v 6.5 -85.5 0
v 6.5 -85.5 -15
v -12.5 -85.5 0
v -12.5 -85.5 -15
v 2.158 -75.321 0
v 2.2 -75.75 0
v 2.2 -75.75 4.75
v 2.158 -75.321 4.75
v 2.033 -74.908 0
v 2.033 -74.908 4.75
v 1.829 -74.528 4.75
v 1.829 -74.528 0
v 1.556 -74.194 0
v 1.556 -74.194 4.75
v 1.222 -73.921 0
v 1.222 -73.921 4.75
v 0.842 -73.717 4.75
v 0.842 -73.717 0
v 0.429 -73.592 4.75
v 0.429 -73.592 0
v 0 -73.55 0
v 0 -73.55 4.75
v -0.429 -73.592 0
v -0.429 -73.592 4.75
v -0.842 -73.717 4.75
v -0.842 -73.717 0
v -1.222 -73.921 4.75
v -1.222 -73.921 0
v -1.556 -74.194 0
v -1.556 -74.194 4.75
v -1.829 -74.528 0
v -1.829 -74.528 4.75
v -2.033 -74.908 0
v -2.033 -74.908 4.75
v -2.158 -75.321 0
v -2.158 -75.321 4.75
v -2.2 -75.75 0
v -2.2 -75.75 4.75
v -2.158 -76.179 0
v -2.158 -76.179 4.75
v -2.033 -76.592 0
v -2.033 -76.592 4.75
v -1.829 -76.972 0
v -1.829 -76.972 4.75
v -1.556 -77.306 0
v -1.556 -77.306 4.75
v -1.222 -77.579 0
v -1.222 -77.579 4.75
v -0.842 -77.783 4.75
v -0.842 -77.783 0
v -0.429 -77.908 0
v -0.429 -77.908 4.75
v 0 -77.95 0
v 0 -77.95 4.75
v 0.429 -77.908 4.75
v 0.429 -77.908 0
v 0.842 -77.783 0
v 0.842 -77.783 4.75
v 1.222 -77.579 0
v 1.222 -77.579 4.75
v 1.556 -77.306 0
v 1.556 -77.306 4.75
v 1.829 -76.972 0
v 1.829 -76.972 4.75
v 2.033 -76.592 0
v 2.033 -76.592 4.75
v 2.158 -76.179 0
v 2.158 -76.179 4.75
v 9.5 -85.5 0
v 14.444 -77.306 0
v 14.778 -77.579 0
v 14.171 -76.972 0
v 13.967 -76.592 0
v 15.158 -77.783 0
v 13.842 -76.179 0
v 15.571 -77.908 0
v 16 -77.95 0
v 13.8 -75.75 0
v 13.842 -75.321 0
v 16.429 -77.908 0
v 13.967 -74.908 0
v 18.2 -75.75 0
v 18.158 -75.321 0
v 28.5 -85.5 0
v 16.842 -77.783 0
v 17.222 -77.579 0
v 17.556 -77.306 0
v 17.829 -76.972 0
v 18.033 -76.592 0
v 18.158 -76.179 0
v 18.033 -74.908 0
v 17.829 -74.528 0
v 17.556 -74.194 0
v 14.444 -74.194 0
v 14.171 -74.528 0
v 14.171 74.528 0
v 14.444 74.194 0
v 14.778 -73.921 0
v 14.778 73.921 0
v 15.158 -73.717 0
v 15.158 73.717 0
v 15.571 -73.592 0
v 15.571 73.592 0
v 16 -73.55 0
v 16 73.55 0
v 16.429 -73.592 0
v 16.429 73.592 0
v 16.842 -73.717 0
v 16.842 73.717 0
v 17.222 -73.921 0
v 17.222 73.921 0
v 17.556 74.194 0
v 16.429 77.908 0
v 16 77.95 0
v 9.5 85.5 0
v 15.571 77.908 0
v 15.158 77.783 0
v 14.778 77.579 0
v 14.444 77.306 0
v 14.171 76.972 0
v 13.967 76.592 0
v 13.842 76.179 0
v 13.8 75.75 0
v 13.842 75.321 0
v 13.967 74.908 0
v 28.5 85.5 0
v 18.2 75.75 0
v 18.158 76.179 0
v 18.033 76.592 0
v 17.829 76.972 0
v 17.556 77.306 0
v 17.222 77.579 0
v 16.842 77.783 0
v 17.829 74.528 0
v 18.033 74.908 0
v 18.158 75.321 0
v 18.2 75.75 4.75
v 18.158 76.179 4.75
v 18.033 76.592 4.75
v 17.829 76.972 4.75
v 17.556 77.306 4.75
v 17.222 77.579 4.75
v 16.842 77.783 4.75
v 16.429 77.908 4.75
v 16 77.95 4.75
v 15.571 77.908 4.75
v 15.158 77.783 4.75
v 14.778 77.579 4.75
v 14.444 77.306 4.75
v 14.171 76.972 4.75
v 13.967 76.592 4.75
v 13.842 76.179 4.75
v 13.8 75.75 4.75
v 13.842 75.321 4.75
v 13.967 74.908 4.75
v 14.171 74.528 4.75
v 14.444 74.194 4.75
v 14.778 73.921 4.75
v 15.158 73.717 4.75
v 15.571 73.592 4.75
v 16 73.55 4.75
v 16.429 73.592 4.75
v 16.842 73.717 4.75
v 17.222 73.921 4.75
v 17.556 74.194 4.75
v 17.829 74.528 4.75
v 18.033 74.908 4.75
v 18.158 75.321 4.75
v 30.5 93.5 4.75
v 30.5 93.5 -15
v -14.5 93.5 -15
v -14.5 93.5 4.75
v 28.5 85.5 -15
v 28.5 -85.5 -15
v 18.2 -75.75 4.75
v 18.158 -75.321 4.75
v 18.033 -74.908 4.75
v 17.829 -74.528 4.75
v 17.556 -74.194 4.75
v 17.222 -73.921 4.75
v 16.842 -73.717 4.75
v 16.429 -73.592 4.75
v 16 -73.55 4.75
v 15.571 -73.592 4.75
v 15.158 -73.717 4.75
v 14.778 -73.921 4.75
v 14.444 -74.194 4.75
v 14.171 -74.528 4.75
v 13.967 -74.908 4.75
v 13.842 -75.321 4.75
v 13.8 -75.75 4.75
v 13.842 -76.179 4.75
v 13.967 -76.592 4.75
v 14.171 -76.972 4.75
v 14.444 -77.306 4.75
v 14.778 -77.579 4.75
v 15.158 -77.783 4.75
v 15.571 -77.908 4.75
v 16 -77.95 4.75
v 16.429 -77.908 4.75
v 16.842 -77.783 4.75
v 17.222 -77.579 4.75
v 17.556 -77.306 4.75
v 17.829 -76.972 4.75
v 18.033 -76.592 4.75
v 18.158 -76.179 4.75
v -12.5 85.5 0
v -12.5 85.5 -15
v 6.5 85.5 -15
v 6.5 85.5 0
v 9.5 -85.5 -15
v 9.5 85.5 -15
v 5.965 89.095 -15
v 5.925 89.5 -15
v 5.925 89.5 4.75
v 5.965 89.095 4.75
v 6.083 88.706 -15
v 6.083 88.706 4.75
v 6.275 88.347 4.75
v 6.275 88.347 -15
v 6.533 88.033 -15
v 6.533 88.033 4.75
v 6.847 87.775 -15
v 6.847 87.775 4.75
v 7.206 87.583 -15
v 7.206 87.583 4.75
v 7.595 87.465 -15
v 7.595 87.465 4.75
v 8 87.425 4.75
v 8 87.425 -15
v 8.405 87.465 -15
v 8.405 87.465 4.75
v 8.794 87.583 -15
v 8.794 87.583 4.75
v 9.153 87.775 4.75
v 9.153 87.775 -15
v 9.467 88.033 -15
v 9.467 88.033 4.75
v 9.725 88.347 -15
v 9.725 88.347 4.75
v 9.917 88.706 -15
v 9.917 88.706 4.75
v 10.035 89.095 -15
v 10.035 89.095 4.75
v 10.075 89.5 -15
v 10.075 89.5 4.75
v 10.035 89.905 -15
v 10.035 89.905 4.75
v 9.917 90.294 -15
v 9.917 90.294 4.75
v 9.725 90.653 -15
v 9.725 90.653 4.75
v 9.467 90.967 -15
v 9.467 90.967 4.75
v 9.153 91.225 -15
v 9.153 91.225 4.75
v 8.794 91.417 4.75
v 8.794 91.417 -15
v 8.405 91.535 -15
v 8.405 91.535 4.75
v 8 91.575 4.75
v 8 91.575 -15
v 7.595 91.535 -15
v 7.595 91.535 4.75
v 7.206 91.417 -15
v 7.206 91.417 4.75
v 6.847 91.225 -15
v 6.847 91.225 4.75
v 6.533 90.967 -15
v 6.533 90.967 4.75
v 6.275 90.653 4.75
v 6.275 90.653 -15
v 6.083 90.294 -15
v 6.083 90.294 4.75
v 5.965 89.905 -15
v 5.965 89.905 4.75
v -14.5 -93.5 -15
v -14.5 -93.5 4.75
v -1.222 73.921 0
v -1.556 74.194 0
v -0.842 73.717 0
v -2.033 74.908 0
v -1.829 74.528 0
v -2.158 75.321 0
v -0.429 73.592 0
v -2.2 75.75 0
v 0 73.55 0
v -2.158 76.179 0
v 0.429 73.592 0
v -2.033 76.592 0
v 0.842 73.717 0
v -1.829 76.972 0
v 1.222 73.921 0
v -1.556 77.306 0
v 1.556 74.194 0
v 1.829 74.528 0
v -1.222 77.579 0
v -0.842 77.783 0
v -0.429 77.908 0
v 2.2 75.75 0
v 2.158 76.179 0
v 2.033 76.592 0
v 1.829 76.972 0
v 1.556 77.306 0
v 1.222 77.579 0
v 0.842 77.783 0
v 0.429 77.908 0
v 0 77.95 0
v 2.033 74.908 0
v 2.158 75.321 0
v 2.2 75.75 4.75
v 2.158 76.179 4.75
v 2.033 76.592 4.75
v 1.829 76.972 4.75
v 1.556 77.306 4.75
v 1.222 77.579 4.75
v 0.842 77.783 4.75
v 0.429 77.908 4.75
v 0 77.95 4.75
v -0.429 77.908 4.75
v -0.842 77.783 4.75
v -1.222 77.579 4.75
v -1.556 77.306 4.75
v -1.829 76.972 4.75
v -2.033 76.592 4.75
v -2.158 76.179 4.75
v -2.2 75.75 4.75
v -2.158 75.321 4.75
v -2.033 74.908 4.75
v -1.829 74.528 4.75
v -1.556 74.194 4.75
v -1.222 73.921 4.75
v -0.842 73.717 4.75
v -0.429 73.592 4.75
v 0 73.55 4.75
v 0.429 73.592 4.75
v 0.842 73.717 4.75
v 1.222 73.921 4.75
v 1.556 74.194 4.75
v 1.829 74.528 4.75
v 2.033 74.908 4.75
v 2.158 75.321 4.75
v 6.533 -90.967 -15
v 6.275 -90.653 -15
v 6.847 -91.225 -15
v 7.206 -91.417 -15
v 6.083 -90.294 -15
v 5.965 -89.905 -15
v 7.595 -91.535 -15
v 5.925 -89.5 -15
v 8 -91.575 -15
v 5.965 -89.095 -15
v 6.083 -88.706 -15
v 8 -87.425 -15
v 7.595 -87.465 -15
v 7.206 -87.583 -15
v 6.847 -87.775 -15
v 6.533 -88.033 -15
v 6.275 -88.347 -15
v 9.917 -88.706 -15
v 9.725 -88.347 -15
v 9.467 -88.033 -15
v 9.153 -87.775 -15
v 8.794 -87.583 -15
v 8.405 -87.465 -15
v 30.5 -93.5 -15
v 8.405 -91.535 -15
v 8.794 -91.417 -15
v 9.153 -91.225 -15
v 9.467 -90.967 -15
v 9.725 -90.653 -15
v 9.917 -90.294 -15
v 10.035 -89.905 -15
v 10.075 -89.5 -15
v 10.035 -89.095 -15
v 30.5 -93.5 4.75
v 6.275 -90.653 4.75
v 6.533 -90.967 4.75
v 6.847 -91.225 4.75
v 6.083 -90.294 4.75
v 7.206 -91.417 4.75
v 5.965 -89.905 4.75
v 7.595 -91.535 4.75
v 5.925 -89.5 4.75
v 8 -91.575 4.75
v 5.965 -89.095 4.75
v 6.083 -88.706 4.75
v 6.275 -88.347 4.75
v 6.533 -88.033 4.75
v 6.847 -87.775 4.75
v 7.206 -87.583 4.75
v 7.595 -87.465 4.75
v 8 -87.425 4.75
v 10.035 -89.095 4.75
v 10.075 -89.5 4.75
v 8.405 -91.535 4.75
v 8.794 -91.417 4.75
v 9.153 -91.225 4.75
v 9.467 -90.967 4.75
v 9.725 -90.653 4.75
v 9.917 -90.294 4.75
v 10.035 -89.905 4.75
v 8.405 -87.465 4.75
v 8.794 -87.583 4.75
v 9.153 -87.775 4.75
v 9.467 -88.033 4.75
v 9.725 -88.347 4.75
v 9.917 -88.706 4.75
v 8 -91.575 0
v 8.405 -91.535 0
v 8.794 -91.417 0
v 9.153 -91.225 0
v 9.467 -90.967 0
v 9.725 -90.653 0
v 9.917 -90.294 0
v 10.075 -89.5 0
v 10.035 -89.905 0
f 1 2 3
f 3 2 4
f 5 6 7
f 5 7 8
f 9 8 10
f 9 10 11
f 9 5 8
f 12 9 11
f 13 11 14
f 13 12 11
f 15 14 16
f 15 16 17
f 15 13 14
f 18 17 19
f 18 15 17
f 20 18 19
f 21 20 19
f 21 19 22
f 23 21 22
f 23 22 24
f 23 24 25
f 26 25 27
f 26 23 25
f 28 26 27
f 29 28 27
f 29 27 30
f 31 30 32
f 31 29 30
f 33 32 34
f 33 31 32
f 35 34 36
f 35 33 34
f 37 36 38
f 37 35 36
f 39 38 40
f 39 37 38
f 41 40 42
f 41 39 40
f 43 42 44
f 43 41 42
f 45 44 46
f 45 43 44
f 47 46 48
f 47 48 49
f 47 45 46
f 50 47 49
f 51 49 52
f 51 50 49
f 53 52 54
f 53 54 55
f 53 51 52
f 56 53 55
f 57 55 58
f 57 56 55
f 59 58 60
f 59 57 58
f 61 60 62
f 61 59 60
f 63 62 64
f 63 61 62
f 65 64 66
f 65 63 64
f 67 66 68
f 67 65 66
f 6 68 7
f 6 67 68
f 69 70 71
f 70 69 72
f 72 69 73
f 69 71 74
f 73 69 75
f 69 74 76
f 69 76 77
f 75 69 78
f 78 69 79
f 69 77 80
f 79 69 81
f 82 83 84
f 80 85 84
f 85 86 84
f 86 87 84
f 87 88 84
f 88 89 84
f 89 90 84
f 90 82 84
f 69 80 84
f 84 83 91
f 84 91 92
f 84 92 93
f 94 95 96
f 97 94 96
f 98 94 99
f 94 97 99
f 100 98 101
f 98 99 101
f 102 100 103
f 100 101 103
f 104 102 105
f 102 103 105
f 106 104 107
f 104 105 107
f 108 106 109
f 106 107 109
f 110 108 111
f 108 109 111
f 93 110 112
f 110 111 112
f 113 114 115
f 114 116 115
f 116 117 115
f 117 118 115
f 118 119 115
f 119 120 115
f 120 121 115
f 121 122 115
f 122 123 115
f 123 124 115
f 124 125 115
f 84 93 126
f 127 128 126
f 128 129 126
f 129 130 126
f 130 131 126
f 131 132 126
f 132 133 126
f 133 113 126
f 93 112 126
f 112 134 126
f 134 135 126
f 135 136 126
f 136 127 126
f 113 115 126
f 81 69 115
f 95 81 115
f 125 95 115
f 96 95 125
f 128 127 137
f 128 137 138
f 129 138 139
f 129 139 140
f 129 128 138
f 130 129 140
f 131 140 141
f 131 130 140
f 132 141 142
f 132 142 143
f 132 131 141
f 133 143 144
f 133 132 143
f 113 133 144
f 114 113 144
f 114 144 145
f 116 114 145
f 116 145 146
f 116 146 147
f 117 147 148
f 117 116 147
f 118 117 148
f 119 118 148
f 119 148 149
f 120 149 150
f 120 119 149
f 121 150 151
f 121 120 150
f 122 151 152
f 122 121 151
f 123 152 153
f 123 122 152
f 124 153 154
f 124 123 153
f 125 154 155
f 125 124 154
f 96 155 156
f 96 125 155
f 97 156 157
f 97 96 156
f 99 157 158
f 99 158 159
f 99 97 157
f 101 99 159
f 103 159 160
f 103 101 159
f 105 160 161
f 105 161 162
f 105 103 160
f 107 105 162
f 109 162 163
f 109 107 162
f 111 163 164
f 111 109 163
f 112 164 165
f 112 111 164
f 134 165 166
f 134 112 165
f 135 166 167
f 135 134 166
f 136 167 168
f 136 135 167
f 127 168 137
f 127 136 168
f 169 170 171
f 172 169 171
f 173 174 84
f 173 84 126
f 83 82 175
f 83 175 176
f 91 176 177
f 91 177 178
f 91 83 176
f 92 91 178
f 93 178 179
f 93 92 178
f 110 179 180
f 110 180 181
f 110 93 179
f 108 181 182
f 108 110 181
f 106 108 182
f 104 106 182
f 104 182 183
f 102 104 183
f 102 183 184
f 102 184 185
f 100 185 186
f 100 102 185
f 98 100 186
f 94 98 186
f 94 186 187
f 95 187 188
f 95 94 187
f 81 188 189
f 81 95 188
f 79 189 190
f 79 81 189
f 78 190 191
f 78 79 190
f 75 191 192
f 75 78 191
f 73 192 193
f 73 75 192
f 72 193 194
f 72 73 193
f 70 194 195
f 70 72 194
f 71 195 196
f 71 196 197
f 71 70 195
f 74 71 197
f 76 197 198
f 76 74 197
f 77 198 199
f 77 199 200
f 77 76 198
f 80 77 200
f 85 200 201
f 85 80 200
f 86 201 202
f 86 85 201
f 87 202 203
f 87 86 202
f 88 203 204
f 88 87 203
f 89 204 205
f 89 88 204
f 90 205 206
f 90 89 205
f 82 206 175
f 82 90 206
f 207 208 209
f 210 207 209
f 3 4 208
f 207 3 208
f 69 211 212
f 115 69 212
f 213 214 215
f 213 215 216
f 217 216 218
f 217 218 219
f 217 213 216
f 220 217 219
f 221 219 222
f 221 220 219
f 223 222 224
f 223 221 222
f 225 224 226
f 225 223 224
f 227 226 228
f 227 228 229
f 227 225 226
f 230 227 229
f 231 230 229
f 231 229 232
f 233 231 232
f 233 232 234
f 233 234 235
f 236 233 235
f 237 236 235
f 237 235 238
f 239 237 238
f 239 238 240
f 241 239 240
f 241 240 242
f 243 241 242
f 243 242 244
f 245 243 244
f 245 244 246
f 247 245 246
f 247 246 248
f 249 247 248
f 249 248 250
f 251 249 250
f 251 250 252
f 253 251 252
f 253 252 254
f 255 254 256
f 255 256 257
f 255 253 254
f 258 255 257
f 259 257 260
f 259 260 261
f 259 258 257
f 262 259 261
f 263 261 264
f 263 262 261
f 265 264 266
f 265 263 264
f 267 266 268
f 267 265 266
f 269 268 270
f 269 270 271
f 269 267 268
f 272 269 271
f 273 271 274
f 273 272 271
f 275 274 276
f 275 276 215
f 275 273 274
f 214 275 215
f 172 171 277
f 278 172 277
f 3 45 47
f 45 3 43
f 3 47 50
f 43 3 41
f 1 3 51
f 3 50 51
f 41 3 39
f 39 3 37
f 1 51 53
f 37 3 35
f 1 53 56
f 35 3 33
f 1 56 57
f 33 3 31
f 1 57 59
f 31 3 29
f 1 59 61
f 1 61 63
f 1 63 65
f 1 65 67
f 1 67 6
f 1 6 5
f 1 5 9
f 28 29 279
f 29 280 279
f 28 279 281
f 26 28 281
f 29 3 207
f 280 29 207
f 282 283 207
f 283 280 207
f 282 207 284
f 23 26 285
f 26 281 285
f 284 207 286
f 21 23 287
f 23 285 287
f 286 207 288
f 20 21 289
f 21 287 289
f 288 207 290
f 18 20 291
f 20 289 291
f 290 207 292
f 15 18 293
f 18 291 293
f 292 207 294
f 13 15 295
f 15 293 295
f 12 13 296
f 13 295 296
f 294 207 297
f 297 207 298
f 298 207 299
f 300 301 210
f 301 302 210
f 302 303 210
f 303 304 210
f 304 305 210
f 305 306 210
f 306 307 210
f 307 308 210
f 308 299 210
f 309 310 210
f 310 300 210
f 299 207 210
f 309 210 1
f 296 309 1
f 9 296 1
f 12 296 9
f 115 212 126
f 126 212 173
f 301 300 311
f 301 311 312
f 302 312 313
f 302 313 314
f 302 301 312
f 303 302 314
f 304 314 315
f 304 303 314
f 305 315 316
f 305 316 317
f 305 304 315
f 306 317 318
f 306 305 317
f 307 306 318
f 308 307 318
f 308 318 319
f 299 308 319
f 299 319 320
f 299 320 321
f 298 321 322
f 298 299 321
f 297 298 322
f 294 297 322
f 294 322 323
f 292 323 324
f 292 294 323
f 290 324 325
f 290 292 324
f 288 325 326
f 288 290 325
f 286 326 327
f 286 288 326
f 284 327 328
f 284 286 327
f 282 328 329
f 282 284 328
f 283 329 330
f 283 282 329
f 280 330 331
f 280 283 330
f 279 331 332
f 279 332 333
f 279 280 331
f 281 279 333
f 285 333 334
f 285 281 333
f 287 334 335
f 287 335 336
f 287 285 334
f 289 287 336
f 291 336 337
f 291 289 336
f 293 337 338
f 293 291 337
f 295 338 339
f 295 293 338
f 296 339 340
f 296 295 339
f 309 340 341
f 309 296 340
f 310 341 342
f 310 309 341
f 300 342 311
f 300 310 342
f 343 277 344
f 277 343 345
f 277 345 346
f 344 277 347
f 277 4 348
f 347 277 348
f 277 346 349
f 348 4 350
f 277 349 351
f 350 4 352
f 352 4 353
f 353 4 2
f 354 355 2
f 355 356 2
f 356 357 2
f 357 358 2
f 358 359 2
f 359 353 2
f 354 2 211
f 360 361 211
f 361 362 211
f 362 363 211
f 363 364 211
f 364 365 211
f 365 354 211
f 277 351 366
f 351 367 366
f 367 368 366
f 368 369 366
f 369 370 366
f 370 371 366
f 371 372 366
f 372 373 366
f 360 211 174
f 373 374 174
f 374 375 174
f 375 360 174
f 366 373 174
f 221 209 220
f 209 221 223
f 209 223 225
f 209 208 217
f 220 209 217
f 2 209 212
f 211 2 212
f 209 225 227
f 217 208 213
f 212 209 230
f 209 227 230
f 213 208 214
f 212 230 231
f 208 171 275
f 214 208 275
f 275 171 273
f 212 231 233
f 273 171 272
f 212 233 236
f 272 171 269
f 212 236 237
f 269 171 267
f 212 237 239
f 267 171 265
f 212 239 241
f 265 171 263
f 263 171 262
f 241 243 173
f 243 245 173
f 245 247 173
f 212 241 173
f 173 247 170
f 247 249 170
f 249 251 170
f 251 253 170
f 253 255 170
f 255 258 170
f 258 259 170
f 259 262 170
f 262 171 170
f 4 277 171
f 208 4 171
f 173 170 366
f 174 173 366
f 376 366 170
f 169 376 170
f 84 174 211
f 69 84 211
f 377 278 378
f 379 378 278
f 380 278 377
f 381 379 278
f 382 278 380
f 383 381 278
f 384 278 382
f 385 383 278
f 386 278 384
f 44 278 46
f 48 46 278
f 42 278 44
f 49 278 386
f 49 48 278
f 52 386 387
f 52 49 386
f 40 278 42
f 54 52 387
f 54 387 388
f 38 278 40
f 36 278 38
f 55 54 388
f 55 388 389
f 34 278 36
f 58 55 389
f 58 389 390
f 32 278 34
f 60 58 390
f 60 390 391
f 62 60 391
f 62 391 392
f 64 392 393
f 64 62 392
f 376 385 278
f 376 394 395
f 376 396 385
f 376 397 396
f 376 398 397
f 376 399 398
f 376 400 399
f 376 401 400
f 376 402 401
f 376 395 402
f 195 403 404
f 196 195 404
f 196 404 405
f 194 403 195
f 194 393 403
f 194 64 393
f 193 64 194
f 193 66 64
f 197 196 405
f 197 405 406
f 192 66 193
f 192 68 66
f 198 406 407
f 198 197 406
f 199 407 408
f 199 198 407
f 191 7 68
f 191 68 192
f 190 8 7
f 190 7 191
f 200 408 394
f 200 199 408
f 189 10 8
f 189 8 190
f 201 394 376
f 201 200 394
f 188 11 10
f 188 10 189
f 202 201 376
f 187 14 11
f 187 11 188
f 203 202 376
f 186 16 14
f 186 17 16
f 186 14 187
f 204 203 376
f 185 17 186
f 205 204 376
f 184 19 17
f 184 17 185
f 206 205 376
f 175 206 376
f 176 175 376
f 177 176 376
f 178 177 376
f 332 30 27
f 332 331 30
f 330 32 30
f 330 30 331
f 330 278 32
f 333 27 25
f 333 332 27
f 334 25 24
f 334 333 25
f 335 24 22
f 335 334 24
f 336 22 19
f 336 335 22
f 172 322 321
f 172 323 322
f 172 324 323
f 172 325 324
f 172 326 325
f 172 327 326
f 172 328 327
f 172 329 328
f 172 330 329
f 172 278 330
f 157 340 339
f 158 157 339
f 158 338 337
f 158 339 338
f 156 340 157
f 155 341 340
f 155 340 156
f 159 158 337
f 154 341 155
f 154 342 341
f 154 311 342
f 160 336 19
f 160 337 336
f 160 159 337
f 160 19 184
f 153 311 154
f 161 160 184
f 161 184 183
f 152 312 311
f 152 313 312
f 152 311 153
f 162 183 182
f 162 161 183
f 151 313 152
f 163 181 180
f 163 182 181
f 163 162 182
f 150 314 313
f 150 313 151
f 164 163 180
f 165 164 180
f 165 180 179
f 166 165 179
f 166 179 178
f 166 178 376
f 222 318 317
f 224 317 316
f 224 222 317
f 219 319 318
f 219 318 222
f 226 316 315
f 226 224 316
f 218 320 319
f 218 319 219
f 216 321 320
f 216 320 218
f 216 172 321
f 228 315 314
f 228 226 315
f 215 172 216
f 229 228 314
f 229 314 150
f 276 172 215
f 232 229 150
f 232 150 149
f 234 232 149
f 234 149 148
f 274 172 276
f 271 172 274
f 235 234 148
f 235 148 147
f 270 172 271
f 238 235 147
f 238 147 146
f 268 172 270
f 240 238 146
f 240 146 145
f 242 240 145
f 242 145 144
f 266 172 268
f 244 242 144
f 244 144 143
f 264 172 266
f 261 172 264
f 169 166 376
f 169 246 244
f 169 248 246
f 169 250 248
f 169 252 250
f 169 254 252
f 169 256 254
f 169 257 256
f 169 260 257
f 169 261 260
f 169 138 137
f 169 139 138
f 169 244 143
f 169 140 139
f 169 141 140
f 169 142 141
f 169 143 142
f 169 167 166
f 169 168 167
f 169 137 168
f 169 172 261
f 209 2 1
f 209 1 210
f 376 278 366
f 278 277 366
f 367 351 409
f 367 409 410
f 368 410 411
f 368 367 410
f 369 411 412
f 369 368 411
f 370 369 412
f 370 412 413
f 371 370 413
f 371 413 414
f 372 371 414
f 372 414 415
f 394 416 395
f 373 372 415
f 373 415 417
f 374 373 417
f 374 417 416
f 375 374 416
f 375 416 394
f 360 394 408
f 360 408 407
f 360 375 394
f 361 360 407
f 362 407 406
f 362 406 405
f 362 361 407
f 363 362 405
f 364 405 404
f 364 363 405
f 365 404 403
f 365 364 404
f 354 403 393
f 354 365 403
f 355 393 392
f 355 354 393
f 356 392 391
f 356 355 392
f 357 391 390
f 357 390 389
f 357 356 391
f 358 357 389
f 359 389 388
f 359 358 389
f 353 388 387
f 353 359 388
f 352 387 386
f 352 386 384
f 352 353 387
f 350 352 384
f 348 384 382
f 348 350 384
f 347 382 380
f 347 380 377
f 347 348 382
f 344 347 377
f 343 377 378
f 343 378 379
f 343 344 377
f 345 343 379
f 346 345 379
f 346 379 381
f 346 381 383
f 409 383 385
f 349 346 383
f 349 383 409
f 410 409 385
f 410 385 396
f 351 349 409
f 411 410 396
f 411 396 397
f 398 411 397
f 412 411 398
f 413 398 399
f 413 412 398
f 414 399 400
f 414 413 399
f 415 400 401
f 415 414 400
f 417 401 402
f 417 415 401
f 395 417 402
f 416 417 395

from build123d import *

# Parameters (mm, degrees)
SKETCH1_W           = 45
SKETCH1_H           = 187
SKETCH1_R           = 2.2
SKETCH1_R_2         = 2.075
BOSS_EXTRUDE1_DEPTH = 4.75
BOSS_EXTRUDE2_START = -15
SKETCH1_3_R         = 2.075
SKETCH1_3_W         = 2
SKETCH1_3_H         = 171
SKETCH1_3_W_2       = 3
BOSS_EXTRUDE2_DEPTH = 15


with BuildPart() as part:
    # Sketch1 → Boss-Extrude1 (new body)
    with BuildSketch(Plane.XY):
        with Locations((8, 0)):
            Rectangle(SKETCH1_W, SKETCH1_H)
        with Locations((0, -75.75)):
            Circle(SKETCH1_R, mode=Mode.SUBTRACT)
        with Locations((16, -75.75)):
            Circle(SKETCH1_R, mode=Mode.SUBTRACT)
        with Locations((0, 75.75)):
            Circle(SKETCH1_R, mode=Mode.SUBTRACT)
        with Locations((16, 75.75)):
            Circle(SKETCH1_R, mode=Mode.SUBTRACT)
        with Locations((8, -89.5)):
            Circle(SKETCH1_R_2, mode=Mode.SUBTRACT)
        with Locations(Location((8, 89.5, 0), (0, 0, 180))):
            Circle(SKETCH1_R_2, mode=Mode.SUBTRACT)
    extrude(amount=BOSS_EXTRUDE1_DEPTH)

    # Sketch1<3> → Boss-Extrude2 (add)
    # profile 1 of 5: a face of its own
    with BuildSketch(Plane.XY.offset(BOSS_EXTRUDE2_START)):
        Polygon((-12.5, 85.5), (-6.5, 85.5), (6.5, 85.5), (9.5, 85.5), (22.5, 85.5), (28.5, 85.5), (30.5, 85.5), (30.5, 93.5), (-14.5, 93.5), (-14.5, 85.5), align=None)
        with Locations(Location((8, 89.5, 0), (0, 0, 180))):
            Circle(SKETCH1_3_R, mode=Mode.SUBTRACT)
    # profile 2 of 5: a face of its own
    with BuildSketch(Plane.XY.offset(BOSS_EXTRUDE2_START)):
        with Locations((-13.5, 0)):
            Rectangle(SKETCH1_3_W, SKETCH1_3_H)
    # profile 3 of 5: a face of its own
    with BuildSketch(Plane.XY.offset(BOSS_EXTRUDE2_START)):
        Polygon((6.5, -85.5), (-6.5, -85.5), (-12.5, -85.5), (-14.5, -85.5), (-14.5, -93.5), (30.5, -93.5), (30.5, -85.5), (28.5, -85.5), (22.5, -85.5), (9.5, -85.5), align=None)
        with Locations(Location((8, -89.5, 0), (0, 0, 270))):
            Circle(SKETCH1_3_R, mode=Mode.SUBTRACT)
    # profile 4 of 5: a face of its own
    with BuildSketch(Plane.XY.offset(BOSS_EXTRUDE2_START)):
        with Locations((29.5, 0)):
            Rectangle(SKETCH1_3_W, SKETCH1_3_H)
    # profile 5 of 5: a face of its own
    with BuildSketch(Plane.XY.offset(BOSS_EXTRUDE2_START)):
        with Locations((8, 0)):
            Rectangle(SKETCH1_3_W_2, SKETCH1_3_H)
    extrude(amount=BOSS_EXTRUDE2_DEPTH)


solid = part.part
